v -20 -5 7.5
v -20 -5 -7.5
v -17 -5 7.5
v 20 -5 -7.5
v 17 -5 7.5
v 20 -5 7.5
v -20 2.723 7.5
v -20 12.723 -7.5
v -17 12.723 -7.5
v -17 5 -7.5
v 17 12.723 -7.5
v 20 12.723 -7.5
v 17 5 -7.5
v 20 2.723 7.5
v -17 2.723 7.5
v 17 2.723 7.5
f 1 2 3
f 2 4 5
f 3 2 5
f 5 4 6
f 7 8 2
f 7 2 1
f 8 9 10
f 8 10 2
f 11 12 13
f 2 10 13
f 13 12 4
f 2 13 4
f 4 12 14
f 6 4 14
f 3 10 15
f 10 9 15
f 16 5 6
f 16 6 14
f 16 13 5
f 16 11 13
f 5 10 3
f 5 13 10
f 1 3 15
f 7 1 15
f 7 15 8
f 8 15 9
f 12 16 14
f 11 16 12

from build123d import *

# Parameters (mm, degrees)
BOSS_EXTRUDE1_DEPTH = 17
BOSS_EXTRUDE2_DEPTH = 3


with BuildPart() as part:
    # Sketch1 → Boss-Extrude1 (new body, symmetric)
    with BuildSketch(Plane(origin=(0, 0, 0), x_dir=(0, 0, -1), z_dir=(1, 0, 0))):
        Polygon((-7.5, -5), (7.5, -5), (7.5, 5), align=None)
    extrude(amount=BOSS_EXTRUDE1_DEPTH, both=True)

    # Sketch2 → Boss-Extrude2 (add)
    with BuildSketch(Plane(origin=(17, 0, 0), x_dir=(0, 0, -1), z_dir=(1, 0, 0))):
        Polygon((-7.5, -5), (-7.5, 2.722617257), (7.5, 12.722617257), (7.5, -5), align=None)
    boss_extrude2 = extrude(amount=BOSS_EXTRUDE2_DEPTH)

    # Mirror1: Boss-Extrude2 across plane
    add(boss_extrude2.mirror(Plane(origin=(0, 0, 0), x_dir=(0, 0, 1), z_dir=(1, 0, 0))))


solid = part.part
